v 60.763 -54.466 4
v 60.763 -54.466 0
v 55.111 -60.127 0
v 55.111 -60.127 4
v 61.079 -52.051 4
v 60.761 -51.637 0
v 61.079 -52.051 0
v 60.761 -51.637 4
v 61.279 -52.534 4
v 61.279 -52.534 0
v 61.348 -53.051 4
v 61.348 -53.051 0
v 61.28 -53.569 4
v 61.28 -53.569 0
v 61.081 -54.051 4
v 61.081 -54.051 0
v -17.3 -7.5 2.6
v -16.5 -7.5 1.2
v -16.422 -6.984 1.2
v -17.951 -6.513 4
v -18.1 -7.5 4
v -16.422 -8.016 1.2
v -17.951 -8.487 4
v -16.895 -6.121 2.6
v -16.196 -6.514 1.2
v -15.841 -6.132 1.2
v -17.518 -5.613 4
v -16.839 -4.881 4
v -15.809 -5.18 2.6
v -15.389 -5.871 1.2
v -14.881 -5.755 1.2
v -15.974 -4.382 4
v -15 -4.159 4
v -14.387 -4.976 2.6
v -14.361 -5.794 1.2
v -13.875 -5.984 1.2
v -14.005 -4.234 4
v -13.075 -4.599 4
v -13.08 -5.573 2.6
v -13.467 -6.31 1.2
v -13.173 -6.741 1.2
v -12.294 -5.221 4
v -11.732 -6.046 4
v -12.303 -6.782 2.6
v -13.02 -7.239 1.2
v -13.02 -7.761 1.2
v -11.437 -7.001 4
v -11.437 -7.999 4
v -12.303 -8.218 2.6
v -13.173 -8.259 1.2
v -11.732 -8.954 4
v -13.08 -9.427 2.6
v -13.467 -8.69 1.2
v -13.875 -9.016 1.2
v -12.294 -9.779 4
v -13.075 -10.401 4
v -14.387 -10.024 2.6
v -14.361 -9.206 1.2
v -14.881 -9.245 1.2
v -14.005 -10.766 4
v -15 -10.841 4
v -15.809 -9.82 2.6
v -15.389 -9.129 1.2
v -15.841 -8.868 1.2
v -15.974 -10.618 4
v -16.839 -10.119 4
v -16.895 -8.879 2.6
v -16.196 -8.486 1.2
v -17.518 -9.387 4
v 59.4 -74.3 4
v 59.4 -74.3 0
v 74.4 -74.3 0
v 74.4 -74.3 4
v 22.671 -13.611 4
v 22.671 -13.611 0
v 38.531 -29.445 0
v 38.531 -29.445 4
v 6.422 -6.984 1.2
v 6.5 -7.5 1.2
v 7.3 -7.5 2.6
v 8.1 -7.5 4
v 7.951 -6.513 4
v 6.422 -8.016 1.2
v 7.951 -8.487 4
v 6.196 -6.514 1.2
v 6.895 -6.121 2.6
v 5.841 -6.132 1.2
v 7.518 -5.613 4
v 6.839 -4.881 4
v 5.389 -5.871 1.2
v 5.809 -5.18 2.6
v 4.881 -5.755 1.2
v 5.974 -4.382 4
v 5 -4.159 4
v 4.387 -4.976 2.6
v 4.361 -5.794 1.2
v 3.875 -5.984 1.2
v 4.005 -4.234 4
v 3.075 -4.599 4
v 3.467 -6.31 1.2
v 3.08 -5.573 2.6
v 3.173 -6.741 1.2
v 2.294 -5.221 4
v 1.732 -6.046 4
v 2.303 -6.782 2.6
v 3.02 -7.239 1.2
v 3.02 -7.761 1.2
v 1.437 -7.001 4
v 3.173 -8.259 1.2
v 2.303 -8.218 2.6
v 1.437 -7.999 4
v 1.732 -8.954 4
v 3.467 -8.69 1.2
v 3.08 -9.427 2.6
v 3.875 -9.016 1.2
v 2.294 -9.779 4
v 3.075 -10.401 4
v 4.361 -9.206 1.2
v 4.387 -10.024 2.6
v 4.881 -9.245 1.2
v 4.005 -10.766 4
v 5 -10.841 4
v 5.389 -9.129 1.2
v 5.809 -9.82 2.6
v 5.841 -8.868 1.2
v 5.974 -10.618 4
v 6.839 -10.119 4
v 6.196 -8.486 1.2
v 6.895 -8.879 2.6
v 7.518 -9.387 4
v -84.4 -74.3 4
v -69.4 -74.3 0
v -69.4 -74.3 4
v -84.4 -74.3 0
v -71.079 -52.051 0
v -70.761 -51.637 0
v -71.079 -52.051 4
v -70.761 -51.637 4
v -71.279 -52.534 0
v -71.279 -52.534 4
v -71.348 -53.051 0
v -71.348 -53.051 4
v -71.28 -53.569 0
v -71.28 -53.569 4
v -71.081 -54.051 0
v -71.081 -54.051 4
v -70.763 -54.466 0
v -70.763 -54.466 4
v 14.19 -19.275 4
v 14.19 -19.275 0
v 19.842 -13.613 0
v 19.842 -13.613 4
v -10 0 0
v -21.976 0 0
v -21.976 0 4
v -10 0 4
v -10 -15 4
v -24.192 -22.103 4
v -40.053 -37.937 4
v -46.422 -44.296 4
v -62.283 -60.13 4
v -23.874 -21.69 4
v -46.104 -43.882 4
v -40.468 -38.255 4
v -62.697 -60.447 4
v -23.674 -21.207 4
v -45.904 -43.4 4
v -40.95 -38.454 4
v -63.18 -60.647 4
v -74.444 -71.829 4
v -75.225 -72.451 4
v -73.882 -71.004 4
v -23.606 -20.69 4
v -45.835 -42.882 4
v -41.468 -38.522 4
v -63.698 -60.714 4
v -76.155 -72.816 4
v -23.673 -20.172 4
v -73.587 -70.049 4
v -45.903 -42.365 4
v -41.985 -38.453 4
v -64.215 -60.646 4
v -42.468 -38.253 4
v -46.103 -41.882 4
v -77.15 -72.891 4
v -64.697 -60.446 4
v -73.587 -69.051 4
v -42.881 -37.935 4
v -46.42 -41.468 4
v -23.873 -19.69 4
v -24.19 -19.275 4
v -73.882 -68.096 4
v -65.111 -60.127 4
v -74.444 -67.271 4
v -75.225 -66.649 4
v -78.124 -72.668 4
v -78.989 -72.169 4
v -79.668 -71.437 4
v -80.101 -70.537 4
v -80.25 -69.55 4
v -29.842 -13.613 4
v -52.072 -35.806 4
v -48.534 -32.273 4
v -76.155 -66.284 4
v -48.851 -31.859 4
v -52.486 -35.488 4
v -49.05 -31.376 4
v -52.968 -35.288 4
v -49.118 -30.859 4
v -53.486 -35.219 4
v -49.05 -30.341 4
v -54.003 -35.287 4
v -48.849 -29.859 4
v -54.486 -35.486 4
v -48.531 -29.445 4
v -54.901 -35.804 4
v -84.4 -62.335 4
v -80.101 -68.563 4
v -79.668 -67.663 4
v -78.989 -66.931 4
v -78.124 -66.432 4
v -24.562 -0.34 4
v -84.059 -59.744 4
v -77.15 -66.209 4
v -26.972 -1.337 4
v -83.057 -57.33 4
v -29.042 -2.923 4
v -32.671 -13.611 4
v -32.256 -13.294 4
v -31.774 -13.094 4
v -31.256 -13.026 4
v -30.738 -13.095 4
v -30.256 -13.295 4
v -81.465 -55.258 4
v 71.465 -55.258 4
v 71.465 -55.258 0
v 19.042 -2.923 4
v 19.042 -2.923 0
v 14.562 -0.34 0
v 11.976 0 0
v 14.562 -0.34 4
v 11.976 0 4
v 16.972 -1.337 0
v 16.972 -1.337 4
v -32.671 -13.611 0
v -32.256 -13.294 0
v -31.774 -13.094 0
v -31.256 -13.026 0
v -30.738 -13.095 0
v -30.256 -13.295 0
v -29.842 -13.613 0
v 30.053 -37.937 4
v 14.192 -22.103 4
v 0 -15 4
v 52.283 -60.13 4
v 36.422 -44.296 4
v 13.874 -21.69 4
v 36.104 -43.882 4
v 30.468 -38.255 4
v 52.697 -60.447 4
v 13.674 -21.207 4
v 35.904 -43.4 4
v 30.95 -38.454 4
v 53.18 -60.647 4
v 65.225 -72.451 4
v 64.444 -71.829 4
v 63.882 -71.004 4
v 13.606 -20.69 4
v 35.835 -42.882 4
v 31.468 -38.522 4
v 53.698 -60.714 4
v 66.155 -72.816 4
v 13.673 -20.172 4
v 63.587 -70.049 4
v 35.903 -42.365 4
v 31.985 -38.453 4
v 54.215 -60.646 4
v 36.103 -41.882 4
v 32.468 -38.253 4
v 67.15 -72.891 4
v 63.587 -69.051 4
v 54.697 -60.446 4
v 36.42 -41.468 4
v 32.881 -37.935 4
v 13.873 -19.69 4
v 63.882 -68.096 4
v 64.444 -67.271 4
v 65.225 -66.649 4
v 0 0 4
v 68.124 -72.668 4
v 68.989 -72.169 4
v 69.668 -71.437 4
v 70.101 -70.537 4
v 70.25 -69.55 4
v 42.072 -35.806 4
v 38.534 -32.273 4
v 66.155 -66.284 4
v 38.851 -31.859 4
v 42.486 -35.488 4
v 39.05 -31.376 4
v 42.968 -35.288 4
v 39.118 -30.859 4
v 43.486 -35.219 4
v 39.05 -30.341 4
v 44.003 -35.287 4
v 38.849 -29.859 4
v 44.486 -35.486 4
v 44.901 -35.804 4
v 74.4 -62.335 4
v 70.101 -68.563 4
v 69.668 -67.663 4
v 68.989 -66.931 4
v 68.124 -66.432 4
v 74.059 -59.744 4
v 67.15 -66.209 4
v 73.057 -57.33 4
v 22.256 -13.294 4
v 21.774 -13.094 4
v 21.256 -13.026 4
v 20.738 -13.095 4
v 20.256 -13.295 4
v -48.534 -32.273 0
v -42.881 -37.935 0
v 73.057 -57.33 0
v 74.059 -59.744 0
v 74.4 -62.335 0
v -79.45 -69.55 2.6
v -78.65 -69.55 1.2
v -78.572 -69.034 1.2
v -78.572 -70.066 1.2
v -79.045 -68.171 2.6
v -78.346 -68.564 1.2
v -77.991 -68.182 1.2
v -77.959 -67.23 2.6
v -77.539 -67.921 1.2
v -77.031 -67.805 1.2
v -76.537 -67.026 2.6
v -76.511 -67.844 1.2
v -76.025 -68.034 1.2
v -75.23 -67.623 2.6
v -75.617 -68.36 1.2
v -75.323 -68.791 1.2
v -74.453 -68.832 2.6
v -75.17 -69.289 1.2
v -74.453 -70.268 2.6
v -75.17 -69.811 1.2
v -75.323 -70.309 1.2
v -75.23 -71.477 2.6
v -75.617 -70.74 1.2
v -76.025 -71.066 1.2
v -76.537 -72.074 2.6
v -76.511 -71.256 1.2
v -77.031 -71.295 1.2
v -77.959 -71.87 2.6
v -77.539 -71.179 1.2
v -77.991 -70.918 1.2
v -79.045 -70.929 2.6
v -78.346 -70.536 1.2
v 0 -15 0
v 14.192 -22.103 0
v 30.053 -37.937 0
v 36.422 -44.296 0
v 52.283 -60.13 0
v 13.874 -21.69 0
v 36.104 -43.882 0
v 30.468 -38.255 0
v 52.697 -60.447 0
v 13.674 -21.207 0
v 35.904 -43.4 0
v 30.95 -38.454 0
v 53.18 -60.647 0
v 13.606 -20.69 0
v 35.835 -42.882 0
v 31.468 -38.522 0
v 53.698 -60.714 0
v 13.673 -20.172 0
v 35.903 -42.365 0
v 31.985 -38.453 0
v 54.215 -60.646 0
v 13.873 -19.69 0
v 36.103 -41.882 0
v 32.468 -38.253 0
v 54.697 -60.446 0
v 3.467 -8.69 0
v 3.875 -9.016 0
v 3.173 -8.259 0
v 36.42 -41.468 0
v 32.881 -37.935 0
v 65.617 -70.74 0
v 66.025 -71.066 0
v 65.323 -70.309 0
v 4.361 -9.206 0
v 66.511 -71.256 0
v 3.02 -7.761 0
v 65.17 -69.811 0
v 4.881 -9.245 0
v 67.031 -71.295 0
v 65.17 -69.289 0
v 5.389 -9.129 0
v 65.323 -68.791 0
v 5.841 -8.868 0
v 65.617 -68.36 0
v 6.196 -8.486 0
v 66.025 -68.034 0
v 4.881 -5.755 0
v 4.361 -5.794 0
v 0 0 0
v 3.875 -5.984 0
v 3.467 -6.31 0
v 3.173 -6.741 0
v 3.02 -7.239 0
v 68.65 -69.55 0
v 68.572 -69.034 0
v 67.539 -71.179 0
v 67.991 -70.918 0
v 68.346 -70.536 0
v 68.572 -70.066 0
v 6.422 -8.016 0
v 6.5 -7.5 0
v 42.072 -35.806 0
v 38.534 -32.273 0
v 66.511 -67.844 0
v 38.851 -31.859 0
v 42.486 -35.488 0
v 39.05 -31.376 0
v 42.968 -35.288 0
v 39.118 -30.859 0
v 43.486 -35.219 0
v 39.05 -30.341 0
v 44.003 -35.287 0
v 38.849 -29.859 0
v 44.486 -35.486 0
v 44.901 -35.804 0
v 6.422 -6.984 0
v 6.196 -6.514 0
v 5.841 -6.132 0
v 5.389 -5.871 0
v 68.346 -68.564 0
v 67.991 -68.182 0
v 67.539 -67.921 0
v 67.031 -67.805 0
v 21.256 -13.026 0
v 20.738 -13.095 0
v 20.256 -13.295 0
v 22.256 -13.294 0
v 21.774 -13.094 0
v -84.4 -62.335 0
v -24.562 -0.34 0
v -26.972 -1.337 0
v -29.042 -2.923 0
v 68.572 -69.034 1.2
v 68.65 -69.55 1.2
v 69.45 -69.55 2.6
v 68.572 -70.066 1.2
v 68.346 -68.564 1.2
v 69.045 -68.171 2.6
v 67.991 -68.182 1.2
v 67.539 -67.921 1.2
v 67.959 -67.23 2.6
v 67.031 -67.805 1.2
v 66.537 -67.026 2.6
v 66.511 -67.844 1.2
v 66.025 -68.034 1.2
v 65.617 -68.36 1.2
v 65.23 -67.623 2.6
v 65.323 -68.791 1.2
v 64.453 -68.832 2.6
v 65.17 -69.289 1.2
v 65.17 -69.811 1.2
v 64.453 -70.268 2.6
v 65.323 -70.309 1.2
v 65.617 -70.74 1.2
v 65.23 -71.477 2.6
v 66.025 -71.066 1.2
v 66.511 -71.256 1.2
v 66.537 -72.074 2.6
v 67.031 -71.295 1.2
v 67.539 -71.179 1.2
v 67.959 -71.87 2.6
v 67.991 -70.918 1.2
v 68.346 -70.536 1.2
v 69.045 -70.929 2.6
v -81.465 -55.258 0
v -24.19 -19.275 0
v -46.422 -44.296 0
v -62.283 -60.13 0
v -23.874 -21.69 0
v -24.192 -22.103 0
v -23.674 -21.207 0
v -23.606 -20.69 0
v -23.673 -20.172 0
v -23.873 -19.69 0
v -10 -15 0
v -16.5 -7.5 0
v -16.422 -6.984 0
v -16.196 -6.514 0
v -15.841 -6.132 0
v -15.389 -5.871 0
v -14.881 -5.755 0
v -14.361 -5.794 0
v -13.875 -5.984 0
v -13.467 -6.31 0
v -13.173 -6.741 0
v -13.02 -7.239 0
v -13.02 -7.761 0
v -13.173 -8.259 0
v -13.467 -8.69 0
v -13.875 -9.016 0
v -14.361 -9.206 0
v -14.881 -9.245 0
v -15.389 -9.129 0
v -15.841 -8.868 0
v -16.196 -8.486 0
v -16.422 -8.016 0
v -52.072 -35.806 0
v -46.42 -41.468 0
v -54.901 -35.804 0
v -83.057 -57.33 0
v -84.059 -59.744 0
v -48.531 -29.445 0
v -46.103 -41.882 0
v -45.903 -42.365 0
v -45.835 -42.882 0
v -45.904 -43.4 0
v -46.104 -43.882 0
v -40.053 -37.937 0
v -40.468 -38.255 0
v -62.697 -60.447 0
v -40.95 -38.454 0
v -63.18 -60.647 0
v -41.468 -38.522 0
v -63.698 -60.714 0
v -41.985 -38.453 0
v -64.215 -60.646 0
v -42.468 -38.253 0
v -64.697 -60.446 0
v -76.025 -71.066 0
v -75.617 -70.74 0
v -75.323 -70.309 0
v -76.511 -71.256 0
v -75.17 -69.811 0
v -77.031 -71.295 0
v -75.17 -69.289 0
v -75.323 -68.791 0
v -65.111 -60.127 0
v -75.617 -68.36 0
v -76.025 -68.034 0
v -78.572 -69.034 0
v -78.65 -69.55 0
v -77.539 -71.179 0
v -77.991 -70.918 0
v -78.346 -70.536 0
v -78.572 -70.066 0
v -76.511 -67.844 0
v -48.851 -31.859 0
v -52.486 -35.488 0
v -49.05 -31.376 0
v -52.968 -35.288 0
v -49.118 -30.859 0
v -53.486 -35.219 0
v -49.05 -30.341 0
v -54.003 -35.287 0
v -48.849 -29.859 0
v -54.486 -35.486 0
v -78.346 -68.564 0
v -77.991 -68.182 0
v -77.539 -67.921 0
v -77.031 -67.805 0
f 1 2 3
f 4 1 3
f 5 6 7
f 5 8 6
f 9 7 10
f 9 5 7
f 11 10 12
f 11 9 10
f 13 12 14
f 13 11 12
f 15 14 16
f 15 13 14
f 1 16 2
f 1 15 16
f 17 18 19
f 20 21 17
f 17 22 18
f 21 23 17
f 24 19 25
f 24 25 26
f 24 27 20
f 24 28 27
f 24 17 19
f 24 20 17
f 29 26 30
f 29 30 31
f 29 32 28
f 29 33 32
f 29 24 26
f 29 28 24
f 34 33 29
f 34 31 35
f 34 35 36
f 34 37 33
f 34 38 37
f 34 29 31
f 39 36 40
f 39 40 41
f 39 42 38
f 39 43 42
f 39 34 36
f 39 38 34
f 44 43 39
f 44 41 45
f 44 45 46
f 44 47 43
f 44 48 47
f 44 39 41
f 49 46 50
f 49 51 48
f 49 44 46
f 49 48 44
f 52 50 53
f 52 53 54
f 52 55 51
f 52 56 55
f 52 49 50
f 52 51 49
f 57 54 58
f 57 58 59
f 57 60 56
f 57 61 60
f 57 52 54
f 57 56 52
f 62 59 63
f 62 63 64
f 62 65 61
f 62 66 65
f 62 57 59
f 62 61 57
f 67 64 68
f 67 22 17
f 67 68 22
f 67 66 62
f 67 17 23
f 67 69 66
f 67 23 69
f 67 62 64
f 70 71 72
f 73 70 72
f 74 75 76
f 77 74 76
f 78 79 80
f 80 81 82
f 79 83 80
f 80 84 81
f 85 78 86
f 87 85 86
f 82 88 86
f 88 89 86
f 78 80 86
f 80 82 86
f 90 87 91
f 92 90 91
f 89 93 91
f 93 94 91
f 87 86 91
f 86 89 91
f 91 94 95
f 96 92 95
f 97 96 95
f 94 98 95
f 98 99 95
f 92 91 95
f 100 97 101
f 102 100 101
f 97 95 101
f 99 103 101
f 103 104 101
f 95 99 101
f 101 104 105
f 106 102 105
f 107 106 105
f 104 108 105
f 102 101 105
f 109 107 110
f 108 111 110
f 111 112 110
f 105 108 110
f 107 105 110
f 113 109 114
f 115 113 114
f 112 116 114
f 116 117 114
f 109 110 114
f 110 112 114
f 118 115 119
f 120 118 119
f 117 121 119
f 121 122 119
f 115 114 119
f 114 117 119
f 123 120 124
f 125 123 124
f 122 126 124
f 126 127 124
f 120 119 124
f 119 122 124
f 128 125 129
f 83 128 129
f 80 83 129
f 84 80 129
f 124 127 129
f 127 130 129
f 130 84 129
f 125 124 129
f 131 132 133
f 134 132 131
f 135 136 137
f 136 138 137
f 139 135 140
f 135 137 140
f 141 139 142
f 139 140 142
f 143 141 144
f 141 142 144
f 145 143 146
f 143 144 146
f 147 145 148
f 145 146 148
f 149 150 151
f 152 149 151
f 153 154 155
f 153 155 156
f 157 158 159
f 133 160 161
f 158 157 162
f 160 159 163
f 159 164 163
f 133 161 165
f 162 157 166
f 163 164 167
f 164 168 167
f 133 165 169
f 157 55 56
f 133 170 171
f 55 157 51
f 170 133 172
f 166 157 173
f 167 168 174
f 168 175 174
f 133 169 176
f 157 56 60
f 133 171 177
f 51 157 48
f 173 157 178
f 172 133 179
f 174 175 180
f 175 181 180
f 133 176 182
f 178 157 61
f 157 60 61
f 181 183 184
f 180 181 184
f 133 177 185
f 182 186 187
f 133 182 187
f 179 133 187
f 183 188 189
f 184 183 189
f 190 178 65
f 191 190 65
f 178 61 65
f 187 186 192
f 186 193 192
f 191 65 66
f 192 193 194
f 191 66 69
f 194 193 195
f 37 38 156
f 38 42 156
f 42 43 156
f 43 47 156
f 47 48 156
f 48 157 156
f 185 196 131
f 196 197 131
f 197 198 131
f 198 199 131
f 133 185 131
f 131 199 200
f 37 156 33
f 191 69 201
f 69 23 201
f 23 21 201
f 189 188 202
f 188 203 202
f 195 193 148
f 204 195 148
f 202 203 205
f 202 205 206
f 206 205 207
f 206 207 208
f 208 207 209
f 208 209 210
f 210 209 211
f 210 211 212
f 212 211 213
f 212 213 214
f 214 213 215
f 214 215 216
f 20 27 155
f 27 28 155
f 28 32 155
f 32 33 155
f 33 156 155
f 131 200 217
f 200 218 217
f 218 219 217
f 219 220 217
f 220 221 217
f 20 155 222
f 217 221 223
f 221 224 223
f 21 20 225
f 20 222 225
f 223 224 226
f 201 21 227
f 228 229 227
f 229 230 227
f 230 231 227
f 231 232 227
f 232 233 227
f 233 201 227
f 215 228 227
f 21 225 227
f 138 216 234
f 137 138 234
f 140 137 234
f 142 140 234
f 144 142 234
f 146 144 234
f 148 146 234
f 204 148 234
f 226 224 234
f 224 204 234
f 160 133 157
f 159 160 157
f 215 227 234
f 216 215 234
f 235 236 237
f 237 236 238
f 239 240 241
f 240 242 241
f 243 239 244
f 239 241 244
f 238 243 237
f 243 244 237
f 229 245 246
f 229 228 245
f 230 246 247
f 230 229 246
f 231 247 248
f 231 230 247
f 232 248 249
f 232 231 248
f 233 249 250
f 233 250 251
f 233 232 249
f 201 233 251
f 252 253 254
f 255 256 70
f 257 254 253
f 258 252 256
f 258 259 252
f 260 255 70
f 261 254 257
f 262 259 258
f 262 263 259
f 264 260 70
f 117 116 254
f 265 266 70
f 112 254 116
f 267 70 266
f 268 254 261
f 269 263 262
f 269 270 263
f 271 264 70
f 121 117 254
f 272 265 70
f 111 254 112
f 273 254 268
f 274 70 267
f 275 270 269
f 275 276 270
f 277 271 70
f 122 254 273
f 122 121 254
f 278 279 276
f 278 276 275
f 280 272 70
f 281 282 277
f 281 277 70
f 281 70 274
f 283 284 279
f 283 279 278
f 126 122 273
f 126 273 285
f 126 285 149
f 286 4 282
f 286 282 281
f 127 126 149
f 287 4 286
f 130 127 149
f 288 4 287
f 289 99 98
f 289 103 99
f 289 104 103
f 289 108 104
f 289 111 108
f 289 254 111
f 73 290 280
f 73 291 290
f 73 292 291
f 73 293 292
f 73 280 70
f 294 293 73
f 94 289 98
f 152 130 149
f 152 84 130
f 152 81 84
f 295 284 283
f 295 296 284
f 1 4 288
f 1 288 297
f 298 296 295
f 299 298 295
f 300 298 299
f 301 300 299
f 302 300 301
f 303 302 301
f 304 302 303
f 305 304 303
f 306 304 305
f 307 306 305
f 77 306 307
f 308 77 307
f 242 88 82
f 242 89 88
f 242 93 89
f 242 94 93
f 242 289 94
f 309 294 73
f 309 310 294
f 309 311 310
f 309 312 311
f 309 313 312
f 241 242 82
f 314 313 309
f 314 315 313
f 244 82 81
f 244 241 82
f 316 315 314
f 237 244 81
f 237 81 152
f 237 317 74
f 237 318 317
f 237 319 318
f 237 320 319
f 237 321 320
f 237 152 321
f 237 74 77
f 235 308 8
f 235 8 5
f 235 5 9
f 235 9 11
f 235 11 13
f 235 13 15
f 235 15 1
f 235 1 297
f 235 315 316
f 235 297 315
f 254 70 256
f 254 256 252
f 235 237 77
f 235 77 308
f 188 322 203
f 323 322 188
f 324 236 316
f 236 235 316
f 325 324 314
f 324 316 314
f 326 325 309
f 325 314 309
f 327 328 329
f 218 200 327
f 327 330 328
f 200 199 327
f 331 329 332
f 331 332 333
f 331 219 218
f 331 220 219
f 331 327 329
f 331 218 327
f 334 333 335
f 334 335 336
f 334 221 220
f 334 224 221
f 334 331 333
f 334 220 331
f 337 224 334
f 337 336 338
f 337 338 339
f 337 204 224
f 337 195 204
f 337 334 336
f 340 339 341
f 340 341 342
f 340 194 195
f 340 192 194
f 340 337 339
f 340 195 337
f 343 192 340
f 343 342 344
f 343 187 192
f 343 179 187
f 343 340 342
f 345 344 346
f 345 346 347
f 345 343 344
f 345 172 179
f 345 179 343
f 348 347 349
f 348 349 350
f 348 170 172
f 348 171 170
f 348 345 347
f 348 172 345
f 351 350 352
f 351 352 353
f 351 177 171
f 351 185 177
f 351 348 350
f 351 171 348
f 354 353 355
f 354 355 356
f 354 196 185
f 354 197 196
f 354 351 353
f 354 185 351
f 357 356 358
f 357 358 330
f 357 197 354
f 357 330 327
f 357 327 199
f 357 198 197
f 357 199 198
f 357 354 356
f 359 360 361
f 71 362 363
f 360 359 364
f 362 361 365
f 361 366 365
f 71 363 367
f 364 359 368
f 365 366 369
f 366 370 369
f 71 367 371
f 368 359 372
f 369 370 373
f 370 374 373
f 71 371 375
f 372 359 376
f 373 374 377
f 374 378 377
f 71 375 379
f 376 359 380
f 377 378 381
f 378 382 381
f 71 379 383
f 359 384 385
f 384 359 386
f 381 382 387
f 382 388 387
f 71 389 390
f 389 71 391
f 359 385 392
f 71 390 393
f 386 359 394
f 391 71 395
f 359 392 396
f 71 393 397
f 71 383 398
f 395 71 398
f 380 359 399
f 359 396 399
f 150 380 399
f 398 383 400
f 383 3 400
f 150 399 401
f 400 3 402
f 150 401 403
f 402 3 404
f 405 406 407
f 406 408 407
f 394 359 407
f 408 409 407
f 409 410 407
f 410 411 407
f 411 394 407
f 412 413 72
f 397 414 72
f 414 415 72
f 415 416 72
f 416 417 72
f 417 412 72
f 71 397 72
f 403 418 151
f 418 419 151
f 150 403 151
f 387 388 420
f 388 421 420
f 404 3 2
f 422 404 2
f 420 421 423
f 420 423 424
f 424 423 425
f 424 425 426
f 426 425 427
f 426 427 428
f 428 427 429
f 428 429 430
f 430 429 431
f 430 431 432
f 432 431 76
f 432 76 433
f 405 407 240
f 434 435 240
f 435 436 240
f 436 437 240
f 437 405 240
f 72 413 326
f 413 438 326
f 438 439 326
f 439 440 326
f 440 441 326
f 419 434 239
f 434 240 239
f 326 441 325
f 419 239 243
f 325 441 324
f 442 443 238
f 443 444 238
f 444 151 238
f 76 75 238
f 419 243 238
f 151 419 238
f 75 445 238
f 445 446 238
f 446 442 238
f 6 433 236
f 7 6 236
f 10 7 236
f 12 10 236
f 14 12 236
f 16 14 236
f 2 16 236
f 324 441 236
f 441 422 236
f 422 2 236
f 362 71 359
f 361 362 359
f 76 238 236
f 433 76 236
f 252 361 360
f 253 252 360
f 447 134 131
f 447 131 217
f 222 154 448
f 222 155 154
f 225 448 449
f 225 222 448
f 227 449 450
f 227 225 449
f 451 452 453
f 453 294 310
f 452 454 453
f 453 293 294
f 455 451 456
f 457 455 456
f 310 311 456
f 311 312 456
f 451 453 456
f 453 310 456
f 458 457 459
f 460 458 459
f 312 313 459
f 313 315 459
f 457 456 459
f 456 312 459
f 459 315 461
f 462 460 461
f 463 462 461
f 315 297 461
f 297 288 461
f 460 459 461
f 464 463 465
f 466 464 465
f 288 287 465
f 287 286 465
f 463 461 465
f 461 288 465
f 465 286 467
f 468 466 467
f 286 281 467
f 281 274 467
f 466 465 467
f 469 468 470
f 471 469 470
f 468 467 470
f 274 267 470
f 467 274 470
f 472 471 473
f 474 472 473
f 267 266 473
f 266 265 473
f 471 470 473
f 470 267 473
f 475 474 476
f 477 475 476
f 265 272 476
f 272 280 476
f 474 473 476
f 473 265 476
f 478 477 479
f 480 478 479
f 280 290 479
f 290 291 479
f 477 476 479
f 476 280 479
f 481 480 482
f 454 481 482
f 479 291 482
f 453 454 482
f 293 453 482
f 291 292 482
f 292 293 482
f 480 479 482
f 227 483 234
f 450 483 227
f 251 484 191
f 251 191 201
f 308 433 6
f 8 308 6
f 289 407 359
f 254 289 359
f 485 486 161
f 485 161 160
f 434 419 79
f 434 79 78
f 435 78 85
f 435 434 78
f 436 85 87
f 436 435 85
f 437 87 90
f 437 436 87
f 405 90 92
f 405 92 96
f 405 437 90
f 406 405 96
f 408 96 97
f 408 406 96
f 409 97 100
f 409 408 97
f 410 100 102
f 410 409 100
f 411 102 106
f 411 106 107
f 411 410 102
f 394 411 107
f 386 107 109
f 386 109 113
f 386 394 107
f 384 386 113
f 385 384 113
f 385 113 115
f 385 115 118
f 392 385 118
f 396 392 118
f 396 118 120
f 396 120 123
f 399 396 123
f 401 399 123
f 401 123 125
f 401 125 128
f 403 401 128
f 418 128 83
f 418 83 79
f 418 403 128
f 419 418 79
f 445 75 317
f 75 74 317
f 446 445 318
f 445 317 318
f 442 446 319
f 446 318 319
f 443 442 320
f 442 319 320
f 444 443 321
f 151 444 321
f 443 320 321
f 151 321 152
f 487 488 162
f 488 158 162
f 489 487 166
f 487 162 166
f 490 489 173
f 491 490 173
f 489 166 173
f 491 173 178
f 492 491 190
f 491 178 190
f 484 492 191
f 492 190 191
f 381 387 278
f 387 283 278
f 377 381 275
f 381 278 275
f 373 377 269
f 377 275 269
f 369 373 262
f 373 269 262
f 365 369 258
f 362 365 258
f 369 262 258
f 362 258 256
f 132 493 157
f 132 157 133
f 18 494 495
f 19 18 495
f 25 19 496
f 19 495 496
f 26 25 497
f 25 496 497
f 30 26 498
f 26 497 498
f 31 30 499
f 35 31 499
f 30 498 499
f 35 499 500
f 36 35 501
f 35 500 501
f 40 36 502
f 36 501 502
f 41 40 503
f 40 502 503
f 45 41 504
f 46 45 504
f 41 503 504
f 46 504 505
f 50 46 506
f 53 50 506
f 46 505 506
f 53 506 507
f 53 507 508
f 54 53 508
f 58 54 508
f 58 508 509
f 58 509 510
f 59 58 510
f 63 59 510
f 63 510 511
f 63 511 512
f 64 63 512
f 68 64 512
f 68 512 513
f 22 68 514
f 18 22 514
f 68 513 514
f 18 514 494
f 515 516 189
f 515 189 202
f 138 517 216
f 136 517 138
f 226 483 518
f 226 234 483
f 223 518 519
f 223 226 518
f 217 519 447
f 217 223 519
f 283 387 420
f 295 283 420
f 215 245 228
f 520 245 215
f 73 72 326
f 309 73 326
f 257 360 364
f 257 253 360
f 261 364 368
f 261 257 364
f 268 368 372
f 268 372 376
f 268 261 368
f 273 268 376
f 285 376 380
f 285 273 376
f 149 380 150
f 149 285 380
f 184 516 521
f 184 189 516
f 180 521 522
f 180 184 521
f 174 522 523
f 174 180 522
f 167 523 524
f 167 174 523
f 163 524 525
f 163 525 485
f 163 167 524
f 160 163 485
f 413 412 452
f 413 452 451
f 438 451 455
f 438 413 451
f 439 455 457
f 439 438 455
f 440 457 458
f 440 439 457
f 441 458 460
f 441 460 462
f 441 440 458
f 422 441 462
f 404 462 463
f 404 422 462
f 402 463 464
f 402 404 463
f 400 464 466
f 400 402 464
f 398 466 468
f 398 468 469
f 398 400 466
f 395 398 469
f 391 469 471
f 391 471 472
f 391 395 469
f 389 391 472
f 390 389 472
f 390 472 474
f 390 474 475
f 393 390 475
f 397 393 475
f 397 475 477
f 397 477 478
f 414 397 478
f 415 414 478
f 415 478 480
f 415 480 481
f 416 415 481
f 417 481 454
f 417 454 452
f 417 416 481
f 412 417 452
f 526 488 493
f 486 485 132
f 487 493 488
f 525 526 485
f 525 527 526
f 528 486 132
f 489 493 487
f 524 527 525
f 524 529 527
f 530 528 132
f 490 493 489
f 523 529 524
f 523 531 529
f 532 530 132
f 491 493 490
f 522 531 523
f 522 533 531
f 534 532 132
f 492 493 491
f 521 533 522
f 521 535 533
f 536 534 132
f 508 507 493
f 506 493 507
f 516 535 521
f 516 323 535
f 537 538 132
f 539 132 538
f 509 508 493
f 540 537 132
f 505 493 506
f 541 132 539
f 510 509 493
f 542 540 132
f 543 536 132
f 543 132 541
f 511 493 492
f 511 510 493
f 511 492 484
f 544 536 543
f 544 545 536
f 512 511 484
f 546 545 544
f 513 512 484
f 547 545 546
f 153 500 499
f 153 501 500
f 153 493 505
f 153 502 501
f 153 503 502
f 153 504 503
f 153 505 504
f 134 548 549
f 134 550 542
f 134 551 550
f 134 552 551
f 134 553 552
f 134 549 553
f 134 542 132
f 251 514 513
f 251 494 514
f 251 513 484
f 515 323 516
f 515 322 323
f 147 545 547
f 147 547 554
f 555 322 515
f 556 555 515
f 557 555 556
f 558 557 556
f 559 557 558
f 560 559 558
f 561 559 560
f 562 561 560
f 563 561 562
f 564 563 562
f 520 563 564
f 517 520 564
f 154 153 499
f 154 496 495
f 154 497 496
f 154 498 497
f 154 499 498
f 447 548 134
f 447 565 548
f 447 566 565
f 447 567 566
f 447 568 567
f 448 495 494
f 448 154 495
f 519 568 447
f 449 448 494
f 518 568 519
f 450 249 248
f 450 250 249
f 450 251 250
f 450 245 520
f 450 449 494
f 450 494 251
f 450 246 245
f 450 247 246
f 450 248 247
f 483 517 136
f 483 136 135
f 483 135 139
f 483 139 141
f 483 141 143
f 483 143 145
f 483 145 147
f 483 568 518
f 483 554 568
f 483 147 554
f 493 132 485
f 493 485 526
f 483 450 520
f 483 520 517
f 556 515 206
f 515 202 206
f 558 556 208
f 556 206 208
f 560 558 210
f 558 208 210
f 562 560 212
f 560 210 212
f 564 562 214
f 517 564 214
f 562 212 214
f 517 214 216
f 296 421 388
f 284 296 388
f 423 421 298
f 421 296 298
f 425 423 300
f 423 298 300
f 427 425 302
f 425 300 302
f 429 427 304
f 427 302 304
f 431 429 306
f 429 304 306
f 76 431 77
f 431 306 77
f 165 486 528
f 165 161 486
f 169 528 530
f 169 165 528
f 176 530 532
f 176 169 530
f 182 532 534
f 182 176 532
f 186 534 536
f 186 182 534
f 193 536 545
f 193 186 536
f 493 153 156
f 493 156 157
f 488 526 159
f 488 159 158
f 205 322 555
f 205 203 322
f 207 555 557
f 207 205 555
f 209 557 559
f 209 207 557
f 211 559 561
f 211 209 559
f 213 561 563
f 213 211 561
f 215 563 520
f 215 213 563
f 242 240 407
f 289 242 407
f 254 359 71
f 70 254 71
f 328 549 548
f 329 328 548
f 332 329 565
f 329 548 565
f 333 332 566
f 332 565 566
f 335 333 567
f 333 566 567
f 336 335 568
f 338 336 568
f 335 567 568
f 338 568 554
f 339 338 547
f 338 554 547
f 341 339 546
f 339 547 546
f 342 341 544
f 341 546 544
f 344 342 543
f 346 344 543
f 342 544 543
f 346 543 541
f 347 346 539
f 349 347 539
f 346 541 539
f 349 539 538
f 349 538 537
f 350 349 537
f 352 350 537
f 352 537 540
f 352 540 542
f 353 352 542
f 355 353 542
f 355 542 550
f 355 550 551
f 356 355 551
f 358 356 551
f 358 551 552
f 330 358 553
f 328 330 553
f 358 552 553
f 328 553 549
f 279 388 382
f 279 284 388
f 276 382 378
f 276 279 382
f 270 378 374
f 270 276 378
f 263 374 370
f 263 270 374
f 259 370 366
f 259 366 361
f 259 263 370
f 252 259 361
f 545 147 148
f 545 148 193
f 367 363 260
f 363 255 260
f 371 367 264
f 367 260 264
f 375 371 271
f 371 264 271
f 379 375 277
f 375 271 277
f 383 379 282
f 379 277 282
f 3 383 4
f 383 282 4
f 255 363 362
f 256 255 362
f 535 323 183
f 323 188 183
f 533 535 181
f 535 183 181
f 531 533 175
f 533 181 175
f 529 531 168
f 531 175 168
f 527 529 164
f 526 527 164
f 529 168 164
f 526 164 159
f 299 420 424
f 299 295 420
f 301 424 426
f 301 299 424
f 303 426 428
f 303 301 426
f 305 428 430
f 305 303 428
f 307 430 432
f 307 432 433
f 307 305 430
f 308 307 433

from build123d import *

# Parameters (mm, degrees)
F0_R     = 1.75
F1_DEPTH = 4
F2_R     = 10
F3_R     = 2
F4_SIZE2 = 1.6
F4_SIZE  = 2.8


with BuildPart() as f1:
    # F0 (on Top) → F1 (new body)
    with BuildSketch(Plane.XY):
        Polygon((16.113648, 0), (0, 0), (0, -15), (59.4, -74.3), (74.4, -74.3), (74.4, -58.188227), align=None)
        with Locations((66.9, -69.55)):
            Circle(F0_R, mode=Mode.SUBTRACT)
        Polygon((43.485104, -34.390495), (62.176472, -53.050396), (53.698342, -61.542823), (35.006974, -42.882922), align=None, mode=Mode.SUBTRACT)
        Polygon((31.468463, -39.350367), (12.777095, -20.690466), (21.255225, -12.198039), (39.946593, -30.857941), align=None, mode=Mode.SUBTRACT)
        with Locations((4.75, -7.5)):
            Circle(F0_R, mode=Mode.SUBTRACT)
    extrude(amount=F1_DEPTH)

    # F2
    f2_edges = [f1.edges().sort_by_distance(p)[0] for p in [
        (16.113648, 0, 2),
        (74.4, -58.188227, 2),
    ]]
    fillet(f2_edges, radius=F2_R)

    # F3
    f3_edges = [f1.edges().sort_by_distance(p)[0] for p in [
        (21.255225, -12.198039, 2),
        (12.777095, -20.690466, 2),
        (39.946593, -30.857941, 2),
        (31.468463, -39.350367, 2),
        (53.698342, -61.542823, 2),
        (62.176472, -53.050396, 2),
        (43.485104, -34.390495, 2),
        (35.006974, -42.882922, 2),
    ]]
    fillet(f3_edges, radius=F3_R)

    # F4
    f4_edges = [f1.edges().sort_by_distance(p)[0] for p in [
        (3, -7.5, 4),
        (65.15, -69.55, 4),
    ]]
    chamfer(f4_edges, length=F4_SIZE, length2=F4_SIZE2)


with BuildPart() as f6_1:
    # F6: instance of F1
    add(f1.part.mirror(Plane.YZ.offset(-5)))


solid = Compound([f1.part, f6_1.part])
